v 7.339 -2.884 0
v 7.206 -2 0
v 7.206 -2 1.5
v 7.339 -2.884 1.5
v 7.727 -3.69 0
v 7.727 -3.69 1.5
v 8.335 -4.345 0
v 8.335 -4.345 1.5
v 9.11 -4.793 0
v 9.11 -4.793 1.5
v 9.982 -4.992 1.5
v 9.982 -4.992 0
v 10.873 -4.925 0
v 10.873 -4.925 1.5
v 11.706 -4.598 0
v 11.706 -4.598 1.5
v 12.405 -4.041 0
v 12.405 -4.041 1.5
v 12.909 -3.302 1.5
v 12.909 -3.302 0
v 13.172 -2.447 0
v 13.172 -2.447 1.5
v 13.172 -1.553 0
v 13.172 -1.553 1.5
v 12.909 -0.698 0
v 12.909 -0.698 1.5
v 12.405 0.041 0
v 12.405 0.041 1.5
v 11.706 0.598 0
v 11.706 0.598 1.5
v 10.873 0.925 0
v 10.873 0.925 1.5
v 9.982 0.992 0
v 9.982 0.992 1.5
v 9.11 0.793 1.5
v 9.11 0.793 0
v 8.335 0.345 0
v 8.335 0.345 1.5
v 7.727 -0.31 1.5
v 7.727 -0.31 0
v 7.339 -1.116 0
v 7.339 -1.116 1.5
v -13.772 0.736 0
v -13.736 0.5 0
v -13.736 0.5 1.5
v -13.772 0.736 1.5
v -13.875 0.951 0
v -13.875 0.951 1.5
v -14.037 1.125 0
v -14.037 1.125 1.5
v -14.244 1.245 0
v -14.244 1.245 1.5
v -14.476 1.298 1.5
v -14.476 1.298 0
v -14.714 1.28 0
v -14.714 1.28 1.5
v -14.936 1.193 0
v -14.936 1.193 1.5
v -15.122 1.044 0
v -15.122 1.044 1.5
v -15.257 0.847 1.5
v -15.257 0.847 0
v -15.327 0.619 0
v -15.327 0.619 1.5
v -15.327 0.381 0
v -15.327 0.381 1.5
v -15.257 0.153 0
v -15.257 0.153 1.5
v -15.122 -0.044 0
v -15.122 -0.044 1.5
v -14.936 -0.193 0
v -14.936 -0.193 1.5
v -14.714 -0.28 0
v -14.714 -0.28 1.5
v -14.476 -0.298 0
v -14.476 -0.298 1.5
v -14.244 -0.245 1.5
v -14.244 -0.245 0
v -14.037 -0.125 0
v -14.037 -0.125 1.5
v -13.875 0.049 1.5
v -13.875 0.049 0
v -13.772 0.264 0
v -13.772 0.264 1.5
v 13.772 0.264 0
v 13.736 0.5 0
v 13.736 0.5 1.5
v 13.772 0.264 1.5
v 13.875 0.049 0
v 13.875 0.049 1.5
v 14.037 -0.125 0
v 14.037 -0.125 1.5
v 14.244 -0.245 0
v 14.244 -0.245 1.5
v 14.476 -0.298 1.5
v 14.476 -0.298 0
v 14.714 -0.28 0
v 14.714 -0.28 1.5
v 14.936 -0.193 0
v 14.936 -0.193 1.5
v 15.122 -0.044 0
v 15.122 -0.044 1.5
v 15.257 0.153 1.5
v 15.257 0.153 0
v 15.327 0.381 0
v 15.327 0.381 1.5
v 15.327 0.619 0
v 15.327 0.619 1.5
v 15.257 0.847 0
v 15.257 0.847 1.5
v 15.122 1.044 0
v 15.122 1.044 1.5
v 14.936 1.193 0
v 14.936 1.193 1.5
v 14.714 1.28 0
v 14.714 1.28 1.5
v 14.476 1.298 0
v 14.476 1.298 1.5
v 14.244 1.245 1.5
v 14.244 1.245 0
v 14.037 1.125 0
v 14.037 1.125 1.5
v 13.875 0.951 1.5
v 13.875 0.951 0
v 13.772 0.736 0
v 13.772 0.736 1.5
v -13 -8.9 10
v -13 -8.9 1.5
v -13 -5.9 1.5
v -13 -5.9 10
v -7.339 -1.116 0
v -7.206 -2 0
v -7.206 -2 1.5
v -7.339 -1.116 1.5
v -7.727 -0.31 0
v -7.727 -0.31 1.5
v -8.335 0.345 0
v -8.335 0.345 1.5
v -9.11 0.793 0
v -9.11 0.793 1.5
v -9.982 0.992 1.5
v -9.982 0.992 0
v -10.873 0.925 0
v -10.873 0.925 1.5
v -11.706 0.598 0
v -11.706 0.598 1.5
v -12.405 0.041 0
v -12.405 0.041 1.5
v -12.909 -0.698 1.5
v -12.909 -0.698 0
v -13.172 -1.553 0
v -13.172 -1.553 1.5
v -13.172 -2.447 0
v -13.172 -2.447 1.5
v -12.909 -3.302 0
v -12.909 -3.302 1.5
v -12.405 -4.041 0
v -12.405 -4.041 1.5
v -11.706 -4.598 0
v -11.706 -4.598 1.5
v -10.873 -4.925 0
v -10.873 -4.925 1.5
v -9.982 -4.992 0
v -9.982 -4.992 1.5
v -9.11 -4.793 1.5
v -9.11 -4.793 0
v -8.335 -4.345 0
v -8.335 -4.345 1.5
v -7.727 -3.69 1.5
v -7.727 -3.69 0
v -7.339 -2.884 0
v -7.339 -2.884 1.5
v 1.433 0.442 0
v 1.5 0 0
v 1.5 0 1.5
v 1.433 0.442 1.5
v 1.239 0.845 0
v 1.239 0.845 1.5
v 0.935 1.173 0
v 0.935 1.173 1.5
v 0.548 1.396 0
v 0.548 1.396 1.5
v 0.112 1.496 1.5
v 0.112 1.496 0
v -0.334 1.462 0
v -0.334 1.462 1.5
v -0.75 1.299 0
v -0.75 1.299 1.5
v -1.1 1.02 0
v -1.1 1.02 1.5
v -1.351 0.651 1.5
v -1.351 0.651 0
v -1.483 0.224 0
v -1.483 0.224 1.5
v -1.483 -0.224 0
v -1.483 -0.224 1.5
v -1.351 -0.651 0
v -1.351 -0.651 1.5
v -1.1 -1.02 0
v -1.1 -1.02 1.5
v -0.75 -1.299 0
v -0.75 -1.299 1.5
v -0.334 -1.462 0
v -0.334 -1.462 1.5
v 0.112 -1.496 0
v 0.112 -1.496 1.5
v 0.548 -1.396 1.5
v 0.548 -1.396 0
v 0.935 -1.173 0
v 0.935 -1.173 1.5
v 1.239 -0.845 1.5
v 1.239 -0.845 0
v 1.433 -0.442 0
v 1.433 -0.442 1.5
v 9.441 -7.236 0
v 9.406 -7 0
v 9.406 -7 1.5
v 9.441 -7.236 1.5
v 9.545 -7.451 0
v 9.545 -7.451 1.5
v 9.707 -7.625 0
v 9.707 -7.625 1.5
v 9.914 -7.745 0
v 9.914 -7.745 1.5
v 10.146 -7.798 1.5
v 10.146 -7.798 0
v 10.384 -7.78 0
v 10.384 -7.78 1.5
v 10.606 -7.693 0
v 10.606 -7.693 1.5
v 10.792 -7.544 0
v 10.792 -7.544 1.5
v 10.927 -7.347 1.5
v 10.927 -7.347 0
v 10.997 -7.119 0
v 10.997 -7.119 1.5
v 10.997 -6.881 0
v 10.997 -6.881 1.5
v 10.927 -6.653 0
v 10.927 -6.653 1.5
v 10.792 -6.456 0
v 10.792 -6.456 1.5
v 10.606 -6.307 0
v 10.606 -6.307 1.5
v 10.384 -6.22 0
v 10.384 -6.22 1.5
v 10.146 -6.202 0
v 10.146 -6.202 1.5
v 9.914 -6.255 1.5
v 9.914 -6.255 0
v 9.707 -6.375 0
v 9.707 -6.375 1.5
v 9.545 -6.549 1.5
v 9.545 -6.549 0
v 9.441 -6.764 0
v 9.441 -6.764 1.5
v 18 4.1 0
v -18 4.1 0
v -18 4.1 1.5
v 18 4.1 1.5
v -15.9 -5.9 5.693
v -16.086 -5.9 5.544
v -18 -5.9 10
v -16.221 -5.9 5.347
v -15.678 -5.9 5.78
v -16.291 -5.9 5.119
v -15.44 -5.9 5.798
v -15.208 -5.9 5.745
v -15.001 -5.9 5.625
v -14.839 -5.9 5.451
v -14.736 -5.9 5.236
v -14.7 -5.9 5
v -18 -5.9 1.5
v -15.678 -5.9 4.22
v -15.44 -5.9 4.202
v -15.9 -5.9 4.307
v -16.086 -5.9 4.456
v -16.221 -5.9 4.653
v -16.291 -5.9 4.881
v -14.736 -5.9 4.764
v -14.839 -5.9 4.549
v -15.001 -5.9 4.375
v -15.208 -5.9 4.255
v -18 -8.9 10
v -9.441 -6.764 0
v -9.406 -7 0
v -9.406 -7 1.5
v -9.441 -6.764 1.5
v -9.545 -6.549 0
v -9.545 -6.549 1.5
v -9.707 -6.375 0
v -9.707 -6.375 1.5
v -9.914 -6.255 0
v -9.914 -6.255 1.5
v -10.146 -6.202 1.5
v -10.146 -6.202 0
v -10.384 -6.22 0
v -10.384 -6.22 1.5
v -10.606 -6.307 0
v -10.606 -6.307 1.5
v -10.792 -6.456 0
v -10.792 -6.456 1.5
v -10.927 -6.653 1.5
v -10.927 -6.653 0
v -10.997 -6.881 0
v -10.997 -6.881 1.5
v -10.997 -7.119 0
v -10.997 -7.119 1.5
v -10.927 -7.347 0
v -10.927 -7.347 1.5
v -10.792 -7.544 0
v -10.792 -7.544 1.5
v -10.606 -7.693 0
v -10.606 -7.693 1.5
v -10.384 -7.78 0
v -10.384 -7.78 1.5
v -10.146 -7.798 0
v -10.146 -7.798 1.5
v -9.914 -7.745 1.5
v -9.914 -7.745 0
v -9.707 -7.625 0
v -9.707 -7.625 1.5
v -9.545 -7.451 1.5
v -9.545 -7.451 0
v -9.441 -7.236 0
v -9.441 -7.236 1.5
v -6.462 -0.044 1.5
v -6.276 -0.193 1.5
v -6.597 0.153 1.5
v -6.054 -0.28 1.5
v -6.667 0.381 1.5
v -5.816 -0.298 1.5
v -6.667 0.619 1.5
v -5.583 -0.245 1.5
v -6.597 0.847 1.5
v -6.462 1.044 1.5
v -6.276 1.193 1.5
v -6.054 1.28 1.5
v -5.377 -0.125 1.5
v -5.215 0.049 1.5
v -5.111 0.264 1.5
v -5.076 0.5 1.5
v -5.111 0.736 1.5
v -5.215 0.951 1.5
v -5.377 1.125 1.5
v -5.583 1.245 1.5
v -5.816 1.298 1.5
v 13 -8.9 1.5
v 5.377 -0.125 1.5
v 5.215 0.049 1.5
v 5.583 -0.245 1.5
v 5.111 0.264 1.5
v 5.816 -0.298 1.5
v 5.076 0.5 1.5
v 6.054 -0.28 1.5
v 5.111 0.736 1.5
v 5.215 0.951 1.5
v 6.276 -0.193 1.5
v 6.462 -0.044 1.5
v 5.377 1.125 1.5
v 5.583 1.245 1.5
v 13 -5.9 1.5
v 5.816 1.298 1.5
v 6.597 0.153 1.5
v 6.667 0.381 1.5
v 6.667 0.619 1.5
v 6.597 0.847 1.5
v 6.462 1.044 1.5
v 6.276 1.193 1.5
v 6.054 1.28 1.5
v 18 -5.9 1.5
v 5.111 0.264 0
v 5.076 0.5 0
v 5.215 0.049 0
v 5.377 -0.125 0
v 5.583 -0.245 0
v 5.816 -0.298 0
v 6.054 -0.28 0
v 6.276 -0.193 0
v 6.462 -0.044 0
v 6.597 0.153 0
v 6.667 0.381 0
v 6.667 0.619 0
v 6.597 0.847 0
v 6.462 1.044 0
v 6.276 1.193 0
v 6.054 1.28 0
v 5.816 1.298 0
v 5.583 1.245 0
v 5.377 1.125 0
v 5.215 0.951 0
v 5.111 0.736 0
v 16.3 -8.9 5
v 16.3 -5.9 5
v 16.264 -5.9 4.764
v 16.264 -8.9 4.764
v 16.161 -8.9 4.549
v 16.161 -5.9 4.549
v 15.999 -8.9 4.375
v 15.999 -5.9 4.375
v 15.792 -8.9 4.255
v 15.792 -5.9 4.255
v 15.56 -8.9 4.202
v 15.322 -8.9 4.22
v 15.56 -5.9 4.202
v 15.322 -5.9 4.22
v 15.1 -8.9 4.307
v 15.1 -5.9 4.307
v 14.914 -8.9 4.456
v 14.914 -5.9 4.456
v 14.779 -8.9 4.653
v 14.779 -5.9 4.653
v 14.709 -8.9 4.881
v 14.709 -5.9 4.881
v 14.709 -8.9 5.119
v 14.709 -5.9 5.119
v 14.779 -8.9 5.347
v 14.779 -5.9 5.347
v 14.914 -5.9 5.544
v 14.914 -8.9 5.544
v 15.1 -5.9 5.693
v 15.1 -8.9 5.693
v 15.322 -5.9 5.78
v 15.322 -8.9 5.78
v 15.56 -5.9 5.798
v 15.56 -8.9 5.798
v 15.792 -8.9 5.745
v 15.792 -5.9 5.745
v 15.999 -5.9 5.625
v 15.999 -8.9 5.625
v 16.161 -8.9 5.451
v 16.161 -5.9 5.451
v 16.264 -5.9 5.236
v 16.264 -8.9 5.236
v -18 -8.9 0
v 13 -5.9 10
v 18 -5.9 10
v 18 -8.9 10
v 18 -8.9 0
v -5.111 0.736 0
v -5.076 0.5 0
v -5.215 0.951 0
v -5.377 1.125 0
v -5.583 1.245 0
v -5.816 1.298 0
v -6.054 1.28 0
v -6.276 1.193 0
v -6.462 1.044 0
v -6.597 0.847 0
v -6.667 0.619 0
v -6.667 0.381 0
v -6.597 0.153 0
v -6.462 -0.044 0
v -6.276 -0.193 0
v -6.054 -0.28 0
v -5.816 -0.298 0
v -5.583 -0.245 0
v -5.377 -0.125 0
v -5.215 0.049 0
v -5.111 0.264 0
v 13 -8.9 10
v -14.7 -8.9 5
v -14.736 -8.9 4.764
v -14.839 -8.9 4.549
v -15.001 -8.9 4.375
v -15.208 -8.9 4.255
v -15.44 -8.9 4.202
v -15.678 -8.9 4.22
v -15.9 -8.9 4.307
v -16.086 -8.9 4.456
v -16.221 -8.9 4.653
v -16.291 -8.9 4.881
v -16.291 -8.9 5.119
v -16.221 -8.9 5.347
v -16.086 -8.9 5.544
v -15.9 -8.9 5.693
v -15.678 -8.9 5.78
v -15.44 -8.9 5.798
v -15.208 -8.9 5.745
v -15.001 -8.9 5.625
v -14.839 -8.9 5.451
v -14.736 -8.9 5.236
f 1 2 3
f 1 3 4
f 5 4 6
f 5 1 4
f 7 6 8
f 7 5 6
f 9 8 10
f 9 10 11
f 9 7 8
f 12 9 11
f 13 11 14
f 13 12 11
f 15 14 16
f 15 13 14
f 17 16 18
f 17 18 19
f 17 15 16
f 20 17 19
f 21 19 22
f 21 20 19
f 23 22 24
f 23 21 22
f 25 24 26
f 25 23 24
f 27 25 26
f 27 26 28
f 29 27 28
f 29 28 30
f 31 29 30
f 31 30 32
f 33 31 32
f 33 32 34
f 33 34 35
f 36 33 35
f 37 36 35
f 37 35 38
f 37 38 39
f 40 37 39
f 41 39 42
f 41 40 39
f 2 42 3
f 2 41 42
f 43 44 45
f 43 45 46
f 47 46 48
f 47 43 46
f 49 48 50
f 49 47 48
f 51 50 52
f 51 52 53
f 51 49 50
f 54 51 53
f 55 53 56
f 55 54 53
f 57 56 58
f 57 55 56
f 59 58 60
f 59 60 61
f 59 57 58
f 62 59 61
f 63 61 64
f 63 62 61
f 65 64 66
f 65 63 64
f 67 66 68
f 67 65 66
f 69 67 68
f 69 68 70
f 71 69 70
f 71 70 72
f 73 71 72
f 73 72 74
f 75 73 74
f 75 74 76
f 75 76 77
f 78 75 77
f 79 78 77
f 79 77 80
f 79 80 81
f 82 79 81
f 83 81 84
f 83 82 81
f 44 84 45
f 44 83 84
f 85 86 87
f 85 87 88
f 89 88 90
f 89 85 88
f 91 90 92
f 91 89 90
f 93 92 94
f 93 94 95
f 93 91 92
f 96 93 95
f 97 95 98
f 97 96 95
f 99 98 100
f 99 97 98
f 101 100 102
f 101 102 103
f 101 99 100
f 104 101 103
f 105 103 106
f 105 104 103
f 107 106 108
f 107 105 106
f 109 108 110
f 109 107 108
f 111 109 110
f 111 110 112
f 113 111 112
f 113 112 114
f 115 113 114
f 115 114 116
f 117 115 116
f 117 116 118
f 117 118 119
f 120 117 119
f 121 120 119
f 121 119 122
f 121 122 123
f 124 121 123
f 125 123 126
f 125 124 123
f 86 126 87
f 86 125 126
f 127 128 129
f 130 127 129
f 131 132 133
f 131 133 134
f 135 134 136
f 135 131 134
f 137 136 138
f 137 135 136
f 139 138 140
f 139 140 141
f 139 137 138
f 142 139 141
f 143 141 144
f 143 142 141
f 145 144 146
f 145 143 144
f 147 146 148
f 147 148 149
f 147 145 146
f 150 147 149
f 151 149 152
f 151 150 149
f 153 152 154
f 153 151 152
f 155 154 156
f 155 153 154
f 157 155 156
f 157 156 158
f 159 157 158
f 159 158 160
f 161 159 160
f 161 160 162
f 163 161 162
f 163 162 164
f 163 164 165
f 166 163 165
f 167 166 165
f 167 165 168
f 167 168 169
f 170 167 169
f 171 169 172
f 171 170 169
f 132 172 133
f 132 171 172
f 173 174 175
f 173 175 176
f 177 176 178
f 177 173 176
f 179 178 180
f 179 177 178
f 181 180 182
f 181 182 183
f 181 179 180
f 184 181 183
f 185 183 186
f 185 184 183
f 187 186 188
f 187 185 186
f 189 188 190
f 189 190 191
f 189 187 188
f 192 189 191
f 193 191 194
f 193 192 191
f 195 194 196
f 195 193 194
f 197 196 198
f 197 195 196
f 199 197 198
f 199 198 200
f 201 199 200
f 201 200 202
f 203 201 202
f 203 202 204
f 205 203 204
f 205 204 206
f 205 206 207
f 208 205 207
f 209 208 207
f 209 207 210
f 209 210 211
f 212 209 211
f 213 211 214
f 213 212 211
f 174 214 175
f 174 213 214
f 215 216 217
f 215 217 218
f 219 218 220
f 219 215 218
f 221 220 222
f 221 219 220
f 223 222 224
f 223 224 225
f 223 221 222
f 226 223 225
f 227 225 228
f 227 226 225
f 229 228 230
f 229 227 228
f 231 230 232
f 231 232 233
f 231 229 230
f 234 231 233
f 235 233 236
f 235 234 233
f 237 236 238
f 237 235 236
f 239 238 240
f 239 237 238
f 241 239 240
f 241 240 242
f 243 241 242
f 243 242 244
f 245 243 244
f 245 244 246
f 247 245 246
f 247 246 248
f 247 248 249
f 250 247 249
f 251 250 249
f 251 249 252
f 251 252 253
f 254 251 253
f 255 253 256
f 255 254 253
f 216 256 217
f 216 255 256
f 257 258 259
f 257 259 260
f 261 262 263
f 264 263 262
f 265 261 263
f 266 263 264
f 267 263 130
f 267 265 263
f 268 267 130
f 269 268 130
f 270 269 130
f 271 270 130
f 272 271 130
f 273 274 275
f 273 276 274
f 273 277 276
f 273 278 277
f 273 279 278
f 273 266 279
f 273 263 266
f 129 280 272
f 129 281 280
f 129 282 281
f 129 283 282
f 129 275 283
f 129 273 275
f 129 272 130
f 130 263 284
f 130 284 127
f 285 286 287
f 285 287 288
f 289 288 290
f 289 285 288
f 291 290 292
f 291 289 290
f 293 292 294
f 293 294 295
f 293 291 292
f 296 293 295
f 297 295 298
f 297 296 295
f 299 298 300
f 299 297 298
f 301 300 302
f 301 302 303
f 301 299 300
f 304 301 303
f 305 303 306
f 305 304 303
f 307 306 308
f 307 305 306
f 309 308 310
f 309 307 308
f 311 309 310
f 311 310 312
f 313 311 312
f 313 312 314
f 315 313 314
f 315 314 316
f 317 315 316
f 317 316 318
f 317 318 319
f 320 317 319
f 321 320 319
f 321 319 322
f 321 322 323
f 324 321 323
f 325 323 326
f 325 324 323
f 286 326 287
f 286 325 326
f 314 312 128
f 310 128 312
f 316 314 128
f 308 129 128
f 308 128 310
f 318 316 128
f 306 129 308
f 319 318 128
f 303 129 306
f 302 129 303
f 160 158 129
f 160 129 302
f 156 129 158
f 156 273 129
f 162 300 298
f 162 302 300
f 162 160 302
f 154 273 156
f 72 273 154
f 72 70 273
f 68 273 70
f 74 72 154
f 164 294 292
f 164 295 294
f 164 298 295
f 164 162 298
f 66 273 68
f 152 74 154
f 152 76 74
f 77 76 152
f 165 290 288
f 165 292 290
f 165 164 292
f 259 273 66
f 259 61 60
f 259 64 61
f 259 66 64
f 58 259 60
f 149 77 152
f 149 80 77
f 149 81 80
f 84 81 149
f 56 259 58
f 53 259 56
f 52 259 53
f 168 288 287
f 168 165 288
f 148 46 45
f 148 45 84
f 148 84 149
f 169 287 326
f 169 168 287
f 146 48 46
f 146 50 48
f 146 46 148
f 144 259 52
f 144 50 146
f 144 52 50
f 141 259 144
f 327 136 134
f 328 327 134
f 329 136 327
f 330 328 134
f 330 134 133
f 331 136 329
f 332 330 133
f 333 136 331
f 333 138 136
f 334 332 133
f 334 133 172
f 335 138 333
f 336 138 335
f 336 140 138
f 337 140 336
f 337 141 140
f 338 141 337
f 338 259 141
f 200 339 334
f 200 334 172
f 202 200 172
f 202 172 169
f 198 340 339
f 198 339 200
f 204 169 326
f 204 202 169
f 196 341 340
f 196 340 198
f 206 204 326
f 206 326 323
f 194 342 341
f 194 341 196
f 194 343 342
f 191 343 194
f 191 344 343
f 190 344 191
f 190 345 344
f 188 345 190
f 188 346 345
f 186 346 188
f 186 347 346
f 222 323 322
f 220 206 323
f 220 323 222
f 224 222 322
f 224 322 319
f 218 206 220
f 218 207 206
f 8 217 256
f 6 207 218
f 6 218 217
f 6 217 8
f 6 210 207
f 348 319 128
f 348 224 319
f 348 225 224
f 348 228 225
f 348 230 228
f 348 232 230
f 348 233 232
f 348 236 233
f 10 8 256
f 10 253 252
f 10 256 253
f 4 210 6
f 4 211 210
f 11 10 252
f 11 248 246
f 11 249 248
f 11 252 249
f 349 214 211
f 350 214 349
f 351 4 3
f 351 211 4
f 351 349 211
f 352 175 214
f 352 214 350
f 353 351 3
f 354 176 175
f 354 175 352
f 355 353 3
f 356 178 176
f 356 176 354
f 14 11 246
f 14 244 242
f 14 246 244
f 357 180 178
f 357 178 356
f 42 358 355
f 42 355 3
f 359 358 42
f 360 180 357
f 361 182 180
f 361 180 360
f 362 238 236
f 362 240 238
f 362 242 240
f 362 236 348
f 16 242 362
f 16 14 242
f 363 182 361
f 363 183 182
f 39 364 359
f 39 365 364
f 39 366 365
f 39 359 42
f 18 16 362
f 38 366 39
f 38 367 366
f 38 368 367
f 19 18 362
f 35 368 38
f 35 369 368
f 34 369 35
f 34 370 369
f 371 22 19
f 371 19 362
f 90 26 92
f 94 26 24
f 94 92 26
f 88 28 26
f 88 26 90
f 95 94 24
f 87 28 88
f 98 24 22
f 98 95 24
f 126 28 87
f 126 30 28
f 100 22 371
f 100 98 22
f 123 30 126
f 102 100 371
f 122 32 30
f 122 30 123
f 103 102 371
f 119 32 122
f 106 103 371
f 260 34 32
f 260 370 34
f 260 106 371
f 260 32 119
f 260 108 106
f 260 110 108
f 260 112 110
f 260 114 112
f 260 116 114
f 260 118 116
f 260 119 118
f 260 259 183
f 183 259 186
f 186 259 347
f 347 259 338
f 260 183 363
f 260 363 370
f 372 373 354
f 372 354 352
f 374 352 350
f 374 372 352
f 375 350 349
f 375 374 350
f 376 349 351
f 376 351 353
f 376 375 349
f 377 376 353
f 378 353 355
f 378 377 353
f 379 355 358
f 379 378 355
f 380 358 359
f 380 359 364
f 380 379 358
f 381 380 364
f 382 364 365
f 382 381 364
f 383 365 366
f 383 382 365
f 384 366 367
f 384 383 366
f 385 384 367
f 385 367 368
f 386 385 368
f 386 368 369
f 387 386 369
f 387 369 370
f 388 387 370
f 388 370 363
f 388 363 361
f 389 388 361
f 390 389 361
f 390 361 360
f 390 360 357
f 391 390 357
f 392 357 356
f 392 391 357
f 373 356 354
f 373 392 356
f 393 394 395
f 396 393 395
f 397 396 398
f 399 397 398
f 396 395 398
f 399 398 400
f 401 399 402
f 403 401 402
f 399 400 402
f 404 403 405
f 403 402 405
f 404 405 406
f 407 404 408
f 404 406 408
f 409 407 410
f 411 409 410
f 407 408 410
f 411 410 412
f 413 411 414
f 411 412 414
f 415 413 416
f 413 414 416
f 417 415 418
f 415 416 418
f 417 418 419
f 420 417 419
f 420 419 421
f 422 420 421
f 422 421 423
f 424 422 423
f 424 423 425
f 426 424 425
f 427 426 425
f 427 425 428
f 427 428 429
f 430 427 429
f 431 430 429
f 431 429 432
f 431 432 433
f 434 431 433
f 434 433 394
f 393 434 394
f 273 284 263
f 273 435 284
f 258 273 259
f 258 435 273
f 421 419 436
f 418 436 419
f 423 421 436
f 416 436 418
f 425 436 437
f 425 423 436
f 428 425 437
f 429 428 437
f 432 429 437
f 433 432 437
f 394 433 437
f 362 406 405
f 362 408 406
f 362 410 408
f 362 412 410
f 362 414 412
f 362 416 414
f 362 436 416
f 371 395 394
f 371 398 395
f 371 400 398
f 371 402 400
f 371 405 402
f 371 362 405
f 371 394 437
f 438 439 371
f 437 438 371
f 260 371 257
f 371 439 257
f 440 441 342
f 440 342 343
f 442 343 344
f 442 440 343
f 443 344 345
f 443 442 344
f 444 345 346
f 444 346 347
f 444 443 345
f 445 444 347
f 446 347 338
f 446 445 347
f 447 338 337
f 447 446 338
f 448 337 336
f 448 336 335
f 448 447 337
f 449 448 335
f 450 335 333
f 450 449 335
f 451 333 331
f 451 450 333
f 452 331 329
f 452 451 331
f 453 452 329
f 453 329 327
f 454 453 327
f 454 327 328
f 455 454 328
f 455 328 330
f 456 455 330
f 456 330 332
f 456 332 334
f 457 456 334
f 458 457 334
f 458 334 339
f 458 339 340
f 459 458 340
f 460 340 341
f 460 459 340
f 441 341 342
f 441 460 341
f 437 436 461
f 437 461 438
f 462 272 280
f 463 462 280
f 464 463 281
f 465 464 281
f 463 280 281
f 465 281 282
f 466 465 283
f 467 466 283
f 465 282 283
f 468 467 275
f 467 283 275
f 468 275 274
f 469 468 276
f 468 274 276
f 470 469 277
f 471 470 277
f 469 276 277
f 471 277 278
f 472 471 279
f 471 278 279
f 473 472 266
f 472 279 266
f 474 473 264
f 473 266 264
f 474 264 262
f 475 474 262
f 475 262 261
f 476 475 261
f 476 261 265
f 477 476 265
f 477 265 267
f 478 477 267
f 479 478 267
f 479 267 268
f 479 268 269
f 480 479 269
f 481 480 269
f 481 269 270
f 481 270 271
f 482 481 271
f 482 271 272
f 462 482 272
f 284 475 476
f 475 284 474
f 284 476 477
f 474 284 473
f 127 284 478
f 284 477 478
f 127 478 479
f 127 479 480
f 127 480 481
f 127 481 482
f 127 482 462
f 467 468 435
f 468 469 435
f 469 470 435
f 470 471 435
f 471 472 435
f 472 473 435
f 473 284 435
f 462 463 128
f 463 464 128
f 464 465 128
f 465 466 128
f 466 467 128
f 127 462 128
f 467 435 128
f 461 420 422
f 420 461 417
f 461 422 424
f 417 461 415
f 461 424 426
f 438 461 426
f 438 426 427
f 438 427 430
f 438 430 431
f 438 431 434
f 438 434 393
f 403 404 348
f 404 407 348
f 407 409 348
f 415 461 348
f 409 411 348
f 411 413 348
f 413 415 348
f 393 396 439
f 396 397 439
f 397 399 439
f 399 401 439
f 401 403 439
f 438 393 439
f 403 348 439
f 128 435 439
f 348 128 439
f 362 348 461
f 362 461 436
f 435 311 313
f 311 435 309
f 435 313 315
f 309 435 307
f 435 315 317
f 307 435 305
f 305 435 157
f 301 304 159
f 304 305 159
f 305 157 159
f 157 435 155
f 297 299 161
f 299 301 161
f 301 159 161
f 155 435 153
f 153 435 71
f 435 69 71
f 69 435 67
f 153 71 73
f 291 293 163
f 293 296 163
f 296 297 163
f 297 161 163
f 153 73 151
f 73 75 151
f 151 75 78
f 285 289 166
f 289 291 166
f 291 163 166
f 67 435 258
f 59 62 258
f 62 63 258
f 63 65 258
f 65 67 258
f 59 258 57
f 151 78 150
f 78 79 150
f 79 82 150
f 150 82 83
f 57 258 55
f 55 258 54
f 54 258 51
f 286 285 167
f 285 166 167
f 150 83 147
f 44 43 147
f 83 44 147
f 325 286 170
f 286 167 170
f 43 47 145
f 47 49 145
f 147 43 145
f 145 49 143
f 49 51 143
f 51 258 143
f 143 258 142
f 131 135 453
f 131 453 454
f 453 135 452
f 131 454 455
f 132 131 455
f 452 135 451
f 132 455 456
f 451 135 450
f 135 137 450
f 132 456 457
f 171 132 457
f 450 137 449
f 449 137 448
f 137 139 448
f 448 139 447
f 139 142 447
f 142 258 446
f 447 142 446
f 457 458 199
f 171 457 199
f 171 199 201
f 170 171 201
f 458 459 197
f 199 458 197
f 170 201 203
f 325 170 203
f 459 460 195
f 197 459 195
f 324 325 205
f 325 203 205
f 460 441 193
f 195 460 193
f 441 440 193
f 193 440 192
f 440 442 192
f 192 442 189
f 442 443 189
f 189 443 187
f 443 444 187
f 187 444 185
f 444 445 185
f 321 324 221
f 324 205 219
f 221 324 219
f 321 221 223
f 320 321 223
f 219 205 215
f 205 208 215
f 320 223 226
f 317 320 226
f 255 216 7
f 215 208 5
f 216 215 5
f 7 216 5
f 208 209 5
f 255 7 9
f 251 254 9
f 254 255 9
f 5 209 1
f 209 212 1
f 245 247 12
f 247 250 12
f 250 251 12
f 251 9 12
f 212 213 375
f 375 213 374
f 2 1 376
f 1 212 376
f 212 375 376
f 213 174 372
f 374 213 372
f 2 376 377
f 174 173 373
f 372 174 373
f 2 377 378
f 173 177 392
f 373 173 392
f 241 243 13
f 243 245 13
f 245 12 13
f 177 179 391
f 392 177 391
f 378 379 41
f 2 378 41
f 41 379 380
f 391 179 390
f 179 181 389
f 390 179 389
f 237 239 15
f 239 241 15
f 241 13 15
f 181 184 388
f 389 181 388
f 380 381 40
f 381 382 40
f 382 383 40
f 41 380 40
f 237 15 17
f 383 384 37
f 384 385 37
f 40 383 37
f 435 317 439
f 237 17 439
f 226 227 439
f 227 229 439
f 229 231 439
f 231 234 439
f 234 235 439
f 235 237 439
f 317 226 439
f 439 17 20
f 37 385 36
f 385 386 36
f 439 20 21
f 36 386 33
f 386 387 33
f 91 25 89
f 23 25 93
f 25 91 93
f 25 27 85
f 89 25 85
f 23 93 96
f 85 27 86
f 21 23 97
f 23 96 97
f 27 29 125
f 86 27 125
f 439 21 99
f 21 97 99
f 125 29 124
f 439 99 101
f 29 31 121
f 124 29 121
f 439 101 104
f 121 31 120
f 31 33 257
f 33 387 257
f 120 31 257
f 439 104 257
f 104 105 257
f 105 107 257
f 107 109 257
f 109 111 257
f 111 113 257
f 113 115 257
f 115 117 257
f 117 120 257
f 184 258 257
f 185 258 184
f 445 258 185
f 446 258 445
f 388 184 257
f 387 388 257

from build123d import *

# Parameters (mm, degrees)
SKETCH_1_W         = 35.99999999
SKETCH_1_H         = 13
SKETCH_1_R         = 2.999999999
SKETCH_1_R_2       = 0.8
SKETCH_1_R_3       = 1.500000001
SKETCH_1_R_4       = 0.799999999
SKETCH_1_R_5       = 0.799999997
SKETCH_1_R_6       = 0.799999998
SKETCH_1_R_7       = 2.999999997
EXTRUDE_1_DEPTH    = 1.5
SKETCH_2_W         = 5
SKETCH_2_H         = 3
SKETCH_2_W_2       = 4.999999998
EXTRUDE_2_DEPTH    = 8.5
HOLE_WIZARD_M2_1_D = 1.6


with BuildPart() as part:
    # 스케치1 → 돌출1 (new body)
    with BuildSketch(Plane.XY):
        with Locations((-1e-09, -2.4)):
            Rectangle(SKETCH_1_W, SKETCH_1_H)
        with Locations((-10.205880656, -2.000000001)):
            Circle(SKETCH_1_R, mode=Mode.SUBTRACT)
        with Locations((-14.536007677, 0.5)):
            Circle(SKETCH_1_R_2, mode=Mode.SUBTRACT)
        with Locations((-5.875753638, 0.499999998)):
            Circle(SKETCH_1_R_2, mode=Mode.SUBTRACT)
        with Locations((-1e-09, 0)):
            Circle(SKETCH_1_R_3, mode=Mode.SUBTRACT)
        with Locations((-10.205880656, -7.000000001)):
            Circle(SKETCH_1_R_4, mode=Mode.SUBTRACT)
        with Locations(Location((10.205880654, -7.000000001, 0), (0, 0, 180))):
            Circle(SKETCH_1_R_5, mode=Mode.SUBTRACT)
        with Locations(Location((5.875753636, 0.499999998, 0), (0, 0, 180))):
            Circle(SKETCH_1_R_5, mode=Mode.SUBTRACT)
        with Locations(Location((14.536007674, 0.5, 0), (0, 0, 180))):
            Circle(SKETCH_1_R_6, mode=Mode.SUBTRACT)
        with Locations(Location((10.205880654, -2.000000001, 0), (0, 0, 180))):
            Circle(SKETCH_1_R_7, mode=Mode.SUBTRACT)
    extrude(amount=EXTRUDE_1_DEPTH)

    # 스케치2 → 돌출2 (add)
    with BuildSketch(Plane.XY.offset(1.5)):
        with Locations((-15.499999996, -7.4)):
            Rectangle(SKETCH_2_W, SKETCH_2_H)
        with Locations((15.499999995, -7.4)):
            Rectangle(SKETCH_2_W_2, SKETCH_2_H)
    extrude(amount=EXTRUDE_2_DEPTH)

    # M2 탭을 위한 탭 드릴1 (through all)
    with Locations(Plane(origin=(-15.499999996, -8.9, 5), x_dir=(-1, 0, 0), z_dir=(0, -1, 0))):
        with Locations((0, 0), (-30.999999991, 0)):
            Hole(HOLE_WIZARD_M2_1_D / 2)


solid = part.part
